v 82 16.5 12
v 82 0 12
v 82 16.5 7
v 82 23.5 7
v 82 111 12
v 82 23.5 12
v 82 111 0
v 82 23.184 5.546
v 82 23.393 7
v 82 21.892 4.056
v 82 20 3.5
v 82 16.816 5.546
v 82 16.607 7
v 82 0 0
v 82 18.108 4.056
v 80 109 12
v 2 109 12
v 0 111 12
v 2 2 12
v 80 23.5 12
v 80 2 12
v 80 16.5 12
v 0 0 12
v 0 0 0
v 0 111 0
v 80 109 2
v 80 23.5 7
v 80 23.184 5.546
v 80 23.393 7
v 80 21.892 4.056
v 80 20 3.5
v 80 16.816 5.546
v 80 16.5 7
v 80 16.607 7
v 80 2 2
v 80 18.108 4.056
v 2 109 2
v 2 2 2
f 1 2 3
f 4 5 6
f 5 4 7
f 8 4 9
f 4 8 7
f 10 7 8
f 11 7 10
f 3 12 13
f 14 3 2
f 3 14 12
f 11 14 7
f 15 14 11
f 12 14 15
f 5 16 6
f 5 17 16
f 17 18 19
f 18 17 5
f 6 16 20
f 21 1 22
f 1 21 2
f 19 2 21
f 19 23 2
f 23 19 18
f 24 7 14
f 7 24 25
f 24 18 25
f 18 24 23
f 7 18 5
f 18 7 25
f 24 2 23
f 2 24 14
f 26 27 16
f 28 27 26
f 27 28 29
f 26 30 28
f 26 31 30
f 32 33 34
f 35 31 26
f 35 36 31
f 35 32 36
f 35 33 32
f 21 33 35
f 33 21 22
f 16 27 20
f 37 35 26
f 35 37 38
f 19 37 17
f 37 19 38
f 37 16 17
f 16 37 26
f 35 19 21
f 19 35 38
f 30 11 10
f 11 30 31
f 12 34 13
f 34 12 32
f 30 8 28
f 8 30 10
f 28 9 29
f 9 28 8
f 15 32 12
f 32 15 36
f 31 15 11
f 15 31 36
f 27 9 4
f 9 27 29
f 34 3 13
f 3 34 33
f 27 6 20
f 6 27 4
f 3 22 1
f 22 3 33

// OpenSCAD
thickness=2;
//arduino_length + 2 * thickness + offset(2)
length=72 + 2 * 2 + 2;
//arduion_width + motor_width + 3 * thickness + offset(2)
width=54 + 45 + 3 * 2 + 2;
height=10;

cable_hole_width=16;
tube_diameter=7;

difference() {
    cube([length + 2 * thickness, width + 2 * thickness, height + thickness]);
    translate([thickness, thickness, thickness]) cube([length, width, height]);
    translate([length + thickness - thickness/2, 2 * thickness + cable_hole_width, tube_diameter]) rotate([0, 90, 0]) cylinder(2 * thickness, r=tube_diameter/2);        
    translate([length + thickness - thickness/2, 2 * thickness + cable_hole_width - tube_diameter/2, tube_diameter]) cube([2 * thickness, tube_diameter, tube_diameter]);
}
